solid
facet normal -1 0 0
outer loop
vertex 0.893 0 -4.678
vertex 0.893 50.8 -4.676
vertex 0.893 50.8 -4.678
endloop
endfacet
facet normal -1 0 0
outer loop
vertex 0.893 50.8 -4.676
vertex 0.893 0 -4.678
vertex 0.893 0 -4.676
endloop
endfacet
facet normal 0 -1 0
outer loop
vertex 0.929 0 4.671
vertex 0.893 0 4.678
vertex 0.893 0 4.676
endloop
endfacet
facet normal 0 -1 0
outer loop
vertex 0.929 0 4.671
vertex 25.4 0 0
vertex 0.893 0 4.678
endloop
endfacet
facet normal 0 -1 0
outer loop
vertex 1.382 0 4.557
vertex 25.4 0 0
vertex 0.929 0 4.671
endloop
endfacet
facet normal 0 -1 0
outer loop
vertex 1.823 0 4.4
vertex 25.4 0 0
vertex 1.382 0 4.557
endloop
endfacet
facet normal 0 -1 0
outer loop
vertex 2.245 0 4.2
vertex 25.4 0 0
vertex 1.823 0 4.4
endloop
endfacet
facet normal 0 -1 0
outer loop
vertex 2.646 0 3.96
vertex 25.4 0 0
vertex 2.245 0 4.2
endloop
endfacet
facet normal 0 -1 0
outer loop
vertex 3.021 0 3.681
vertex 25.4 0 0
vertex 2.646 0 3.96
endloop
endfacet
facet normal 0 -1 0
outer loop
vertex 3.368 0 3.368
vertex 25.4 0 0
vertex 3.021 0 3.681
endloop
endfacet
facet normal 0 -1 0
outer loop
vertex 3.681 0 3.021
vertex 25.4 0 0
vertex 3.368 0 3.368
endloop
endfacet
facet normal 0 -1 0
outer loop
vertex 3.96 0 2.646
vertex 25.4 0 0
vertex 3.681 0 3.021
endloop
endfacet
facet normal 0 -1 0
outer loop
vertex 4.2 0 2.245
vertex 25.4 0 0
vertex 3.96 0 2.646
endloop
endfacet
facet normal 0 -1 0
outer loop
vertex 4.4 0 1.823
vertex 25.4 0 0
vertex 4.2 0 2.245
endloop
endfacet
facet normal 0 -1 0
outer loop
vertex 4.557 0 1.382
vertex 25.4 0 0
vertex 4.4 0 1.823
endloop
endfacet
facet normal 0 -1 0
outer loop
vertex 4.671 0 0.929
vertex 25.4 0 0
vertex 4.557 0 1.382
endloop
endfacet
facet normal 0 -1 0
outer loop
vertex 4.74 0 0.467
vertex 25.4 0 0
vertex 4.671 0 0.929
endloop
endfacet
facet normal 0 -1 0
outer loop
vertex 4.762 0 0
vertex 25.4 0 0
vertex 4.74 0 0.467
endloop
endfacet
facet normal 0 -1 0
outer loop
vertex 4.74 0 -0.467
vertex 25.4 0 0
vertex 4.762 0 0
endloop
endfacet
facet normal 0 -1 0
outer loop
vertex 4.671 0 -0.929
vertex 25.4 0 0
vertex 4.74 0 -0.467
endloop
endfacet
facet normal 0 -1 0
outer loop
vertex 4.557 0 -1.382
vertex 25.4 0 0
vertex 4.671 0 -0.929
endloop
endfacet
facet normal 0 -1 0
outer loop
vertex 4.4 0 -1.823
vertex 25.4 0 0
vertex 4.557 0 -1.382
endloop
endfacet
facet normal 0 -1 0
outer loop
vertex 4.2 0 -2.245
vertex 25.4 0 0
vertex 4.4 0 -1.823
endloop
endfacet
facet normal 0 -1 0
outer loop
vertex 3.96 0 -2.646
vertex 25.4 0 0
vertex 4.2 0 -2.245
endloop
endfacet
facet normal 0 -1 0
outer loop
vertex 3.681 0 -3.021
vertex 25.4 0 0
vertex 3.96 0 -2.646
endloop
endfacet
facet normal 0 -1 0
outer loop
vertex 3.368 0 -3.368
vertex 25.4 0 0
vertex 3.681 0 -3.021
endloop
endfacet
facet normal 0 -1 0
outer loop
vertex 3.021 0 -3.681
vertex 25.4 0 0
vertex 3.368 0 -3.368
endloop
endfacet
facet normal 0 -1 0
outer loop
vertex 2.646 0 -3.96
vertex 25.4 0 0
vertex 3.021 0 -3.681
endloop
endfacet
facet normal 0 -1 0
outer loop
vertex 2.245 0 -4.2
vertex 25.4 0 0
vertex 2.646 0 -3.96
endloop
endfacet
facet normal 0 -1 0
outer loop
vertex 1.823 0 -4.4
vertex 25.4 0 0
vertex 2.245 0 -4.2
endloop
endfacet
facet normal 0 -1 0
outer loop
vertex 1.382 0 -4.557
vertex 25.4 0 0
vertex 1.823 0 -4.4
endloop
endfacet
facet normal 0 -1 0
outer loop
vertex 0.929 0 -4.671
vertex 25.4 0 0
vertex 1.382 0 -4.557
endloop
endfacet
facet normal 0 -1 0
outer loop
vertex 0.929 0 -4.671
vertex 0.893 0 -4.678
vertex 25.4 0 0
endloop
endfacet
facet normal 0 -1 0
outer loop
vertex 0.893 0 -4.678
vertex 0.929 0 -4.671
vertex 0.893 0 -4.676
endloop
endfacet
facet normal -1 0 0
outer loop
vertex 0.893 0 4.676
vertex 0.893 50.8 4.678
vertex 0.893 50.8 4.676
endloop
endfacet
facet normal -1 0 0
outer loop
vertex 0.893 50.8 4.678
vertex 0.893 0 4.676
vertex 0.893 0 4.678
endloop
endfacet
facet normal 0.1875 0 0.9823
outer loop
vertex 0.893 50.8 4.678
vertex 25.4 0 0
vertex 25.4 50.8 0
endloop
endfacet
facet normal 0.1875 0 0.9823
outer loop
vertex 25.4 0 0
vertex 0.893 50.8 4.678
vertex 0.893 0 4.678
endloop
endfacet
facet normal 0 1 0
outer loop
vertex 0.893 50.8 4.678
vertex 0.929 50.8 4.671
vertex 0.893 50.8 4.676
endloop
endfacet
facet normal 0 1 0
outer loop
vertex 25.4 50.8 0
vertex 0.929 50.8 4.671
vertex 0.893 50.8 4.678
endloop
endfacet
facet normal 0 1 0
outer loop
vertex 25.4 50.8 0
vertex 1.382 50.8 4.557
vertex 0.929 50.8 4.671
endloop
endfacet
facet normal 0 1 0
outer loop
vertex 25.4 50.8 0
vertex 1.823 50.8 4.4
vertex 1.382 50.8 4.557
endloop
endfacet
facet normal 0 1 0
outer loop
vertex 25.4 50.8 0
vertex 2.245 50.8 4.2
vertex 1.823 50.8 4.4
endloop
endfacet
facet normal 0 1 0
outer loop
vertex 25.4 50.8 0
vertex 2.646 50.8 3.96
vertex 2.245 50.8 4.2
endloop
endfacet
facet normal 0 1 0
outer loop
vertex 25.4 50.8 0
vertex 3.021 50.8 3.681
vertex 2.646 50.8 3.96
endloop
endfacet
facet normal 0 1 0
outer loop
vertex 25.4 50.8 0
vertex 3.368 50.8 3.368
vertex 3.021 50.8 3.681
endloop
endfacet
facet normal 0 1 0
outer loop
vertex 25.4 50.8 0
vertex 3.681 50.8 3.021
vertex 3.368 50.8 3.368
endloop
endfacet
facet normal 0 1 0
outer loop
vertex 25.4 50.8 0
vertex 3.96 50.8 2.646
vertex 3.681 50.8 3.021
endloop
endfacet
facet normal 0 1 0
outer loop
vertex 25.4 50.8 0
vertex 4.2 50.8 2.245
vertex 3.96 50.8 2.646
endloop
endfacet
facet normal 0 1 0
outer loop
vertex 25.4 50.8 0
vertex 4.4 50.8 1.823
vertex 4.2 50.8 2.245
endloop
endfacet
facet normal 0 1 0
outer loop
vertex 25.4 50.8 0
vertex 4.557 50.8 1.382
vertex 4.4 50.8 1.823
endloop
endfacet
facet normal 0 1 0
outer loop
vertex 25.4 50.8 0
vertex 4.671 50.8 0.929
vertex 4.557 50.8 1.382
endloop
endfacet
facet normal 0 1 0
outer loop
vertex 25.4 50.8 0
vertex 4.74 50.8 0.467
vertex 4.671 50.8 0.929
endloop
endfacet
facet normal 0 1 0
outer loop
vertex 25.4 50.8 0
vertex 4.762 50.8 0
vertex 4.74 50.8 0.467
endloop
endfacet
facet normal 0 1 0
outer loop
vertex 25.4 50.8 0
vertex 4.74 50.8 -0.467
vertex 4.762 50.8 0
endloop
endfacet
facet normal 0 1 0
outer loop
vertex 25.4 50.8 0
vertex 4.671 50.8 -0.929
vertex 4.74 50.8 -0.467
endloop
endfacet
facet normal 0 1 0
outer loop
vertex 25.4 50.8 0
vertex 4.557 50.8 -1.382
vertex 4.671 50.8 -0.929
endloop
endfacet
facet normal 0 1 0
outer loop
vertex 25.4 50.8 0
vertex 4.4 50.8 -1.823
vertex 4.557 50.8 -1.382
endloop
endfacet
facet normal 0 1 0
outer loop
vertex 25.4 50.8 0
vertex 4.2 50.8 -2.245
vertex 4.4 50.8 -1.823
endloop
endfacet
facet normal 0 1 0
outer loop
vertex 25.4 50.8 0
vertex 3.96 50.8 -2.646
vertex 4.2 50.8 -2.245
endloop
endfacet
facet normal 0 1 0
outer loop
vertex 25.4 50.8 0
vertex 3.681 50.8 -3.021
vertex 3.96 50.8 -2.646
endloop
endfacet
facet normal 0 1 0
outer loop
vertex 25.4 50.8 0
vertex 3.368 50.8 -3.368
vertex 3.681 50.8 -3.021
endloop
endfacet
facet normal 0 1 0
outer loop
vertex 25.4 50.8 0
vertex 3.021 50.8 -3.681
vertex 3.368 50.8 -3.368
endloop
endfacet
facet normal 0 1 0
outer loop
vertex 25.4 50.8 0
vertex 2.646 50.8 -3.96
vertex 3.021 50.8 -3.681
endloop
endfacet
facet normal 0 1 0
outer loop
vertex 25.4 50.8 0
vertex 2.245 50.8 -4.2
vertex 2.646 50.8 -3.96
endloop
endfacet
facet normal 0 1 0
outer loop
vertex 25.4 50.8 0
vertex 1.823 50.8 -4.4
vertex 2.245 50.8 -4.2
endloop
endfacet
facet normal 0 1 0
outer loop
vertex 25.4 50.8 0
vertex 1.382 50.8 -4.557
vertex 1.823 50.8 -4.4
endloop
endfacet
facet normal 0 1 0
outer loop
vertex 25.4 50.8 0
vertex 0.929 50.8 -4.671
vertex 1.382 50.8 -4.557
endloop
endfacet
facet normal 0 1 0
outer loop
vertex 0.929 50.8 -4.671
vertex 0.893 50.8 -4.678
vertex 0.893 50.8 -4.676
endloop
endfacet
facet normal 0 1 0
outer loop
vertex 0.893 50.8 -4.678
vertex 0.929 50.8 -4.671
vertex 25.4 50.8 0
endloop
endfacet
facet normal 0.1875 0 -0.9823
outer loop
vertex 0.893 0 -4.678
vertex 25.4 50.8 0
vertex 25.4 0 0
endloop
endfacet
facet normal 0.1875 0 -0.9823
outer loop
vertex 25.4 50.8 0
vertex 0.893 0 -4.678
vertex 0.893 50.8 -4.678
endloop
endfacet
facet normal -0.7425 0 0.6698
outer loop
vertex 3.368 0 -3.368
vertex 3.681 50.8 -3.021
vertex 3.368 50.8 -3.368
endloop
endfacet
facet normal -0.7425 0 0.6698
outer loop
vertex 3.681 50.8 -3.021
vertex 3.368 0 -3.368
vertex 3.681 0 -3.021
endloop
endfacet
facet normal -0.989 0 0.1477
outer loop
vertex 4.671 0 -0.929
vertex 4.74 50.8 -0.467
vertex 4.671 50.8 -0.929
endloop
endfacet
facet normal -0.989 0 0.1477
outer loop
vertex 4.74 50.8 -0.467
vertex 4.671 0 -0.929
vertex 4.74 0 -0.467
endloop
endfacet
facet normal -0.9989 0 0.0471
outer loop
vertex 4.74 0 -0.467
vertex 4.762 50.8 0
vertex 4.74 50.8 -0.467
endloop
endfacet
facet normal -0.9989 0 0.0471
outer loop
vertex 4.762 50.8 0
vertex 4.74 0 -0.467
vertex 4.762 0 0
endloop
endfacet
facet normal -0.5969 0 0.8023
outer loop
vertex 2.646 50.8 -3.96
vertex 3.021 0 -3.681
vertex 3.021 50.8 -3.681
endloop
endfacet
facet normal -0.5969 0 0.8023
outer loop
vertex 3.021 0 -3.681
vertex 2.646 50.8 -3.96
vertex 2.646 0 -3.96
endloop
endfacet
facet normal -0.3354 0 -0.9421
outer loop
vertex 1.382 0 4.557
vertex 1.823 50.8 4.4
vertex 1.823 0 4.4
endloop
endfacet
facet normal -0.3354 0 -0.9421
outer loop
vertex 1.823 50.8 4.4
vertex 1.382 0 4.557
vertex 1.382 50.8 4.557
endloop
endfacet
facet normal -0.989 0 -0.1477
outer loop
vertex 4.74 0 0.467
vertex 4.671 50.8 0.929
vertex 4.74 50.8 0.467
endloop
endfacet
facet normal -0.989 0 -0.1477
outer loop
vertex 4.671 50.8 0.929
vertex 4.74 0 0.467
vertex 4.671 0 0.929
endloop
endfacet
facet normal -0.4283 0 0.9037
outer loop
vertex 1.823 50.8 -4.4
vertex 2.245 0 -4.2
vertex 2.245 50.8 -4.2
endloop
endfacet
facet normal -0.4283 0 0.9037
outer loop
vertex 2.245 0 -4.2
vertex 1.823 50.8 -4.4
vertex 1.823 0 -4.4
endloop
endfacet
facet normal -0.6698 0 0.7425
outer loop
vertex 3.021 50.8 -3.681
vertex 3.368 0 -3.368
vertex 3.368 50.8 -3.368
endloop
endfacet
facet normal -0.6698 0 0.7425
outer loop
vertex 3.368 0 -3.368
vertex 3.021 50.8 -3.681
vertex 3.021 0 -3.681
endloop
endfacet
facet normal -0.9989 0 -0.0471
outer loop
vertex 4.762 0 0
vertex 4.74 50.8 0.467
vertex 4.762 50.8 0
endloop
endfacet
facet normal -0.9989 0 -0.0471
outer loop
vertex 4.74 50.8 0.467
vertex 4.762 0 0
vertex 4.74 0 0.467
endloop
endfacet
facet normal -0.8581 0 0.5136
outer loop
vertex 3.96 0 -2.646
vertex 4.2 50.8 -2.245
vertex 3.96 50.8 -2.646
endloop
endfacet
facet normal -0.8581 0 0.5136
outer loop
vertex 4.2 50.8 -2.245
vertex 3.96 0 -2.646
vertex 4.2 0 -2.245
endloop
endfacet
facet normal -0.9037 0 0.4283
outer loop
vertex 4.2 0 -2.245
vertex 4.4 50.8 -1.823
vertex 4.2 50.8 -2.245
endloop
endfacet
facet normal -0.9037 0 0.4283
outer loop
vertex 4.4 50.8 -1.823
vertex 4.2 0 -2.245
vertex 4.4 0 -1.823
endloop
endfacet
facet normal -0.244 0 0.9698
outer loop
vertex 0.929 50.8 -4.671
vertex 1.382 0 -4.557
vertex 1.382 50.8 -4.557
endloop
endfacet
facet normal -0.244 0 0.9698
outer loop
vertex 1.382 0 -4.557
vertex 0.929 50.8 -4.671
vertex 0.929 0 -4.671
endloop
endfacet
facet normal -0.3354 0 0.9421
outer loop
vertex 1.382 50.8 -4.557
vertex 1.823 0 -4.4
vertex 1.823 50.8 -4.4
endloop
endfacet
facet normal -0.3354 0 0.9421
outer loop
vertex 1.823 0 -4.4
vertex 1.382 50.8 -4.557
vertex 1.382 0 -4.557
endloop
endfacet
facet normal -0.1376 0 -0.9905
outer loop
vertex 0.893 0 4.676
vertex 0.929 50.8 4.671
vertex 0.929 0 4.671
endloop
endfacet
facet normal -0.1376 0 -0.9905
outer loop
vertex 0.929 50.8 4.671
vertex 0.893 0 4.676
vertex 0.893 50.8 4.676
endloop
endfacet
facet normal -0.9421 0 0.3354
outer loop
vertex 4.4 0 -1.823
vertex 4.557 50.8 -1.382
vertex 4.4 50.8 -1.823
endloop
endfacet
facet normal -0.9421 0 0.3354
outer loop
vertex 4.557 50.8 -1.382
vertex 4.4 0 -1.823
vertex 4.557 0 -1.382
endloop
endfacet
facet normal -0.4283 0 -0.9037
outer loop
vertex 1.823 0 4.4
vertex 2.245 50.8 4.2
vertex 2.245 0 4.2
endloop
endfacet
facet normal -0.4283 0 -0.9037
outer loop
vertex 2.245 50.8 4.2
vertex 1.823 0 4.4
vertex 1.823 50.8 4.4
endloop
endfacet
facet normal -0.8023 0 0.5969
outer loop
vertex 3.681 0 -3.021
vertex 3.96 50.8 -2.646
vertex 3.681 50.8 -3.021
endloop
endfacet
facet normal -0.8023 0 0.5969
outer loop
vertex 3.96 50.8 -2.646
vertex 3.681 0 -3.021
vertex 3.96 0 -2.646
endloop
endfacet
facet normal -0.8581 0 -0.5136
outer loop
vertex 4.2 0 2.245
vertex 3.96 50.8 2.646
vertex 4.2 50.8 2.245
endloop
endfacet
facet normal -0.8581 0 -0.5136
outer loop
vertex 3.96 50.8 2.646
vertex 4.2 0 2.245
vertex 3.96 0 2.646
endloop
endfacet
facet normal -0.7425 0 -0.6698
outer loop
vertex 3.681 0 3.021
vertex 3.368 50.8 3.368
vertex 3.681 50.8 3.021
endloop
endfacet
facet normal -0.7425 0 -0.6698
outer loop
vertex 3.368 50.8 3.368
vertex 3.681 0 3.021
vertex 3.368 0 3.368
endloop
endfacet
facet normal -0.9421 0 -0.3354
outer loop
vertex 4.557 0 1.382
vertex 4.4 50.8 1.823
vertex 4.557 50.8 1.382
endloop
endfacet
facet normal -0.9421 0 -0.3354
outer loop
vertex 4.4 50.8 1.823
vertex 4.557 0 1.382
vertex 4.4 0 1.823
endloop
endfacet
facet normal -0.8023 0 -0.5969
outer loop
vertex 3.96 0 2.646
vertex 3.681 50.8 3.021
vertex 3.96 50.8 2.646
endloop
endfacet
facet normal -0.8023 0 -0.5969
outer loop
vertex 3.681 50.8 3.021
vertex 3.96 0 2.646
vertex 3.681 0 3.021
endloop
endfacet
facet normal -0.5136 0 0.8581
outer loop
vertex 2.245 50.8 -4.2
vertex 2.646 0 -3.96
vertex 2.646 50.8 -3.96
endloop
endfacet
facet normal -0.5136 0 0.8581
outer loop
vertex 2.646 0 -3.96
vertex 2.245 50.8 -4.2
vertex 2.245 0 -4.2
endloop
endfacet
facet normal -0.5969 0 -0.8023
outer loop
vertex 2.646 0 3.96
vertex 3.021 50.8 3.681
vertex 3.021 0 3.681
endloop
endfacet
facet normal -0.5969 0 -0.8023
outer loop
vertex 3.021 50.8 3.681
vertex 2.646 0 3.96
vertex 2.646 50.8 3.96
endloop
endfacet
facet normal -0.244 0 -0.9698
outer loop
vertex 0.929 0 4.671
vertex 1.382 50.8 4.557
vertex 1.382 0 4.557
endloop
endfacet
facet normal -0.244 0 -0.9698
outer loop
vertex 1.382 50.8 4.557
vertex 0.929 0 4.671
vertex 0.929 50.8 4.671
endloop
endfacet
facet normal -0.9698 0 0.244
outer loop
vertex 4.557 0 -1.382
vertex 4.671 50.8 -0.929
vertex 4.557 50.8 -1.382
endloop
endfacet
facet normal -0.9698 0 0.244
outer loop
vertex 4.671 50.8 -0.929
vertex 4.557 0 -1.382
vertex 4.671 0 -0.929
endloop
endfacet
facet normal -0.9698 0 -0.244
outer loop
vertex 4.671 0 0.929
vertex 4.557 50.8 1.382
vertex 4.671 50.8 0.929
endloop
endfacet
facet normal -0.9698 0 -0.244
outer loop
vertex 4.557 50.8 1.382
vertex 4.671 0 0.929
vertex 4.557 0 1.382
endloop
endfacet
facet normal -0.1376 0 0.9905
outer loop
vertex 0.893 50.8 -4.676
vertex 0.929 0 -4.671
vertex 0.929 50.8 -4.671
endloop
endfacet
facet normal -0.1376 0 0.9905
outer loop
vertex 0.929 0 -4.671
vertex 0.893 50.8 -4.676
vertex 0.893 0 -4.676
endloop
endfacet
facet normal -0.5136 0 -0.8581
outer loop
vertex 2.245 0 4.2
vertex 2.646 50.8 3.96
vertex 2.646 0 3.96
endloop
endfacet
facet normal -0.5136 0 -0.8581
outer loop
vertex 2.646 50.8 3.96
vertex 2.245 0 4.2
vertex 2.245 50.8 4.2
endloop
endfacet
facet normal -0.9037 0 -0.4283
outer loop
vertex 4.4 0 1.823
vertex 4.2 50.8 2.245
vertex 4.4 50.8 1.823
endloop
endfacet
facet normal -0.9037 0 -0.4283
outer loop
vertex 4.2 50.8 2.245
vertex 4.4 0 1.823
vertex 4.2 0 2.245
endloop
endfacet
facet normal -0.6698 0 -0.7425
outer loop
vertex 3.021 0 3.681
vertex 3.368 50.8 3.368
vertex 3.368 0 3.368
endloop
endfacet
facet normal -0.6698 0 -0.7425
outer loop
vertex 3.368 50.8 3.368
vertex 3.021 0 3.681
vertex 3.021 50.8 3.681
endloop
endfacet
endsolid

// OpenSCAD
in = 25.4;
eps = 0.1;

$fn = 64;

r = 3/8*in/2;
w = 2*in;
l = 1*in;

module stick() {
    translate([0, -eps, 0])
    rotate([ -90, 0, 0])
    cylinder(r=r, h=w+2*eps);
};

module wedge() {
    xt = r*r/l;
    yt = sqrt(r*r-xt*xt);

    translate([0, w, 0 ])
    rotate([90, 0, 0])
    linear_extrude(w)
    polygon([
        [ l, 0 ],
        [ xt, yt ],
        [ 0, 0 ],
        [ xt, -yt ]
    ]);
};

difference() {
    wedge();
    stick();
};
